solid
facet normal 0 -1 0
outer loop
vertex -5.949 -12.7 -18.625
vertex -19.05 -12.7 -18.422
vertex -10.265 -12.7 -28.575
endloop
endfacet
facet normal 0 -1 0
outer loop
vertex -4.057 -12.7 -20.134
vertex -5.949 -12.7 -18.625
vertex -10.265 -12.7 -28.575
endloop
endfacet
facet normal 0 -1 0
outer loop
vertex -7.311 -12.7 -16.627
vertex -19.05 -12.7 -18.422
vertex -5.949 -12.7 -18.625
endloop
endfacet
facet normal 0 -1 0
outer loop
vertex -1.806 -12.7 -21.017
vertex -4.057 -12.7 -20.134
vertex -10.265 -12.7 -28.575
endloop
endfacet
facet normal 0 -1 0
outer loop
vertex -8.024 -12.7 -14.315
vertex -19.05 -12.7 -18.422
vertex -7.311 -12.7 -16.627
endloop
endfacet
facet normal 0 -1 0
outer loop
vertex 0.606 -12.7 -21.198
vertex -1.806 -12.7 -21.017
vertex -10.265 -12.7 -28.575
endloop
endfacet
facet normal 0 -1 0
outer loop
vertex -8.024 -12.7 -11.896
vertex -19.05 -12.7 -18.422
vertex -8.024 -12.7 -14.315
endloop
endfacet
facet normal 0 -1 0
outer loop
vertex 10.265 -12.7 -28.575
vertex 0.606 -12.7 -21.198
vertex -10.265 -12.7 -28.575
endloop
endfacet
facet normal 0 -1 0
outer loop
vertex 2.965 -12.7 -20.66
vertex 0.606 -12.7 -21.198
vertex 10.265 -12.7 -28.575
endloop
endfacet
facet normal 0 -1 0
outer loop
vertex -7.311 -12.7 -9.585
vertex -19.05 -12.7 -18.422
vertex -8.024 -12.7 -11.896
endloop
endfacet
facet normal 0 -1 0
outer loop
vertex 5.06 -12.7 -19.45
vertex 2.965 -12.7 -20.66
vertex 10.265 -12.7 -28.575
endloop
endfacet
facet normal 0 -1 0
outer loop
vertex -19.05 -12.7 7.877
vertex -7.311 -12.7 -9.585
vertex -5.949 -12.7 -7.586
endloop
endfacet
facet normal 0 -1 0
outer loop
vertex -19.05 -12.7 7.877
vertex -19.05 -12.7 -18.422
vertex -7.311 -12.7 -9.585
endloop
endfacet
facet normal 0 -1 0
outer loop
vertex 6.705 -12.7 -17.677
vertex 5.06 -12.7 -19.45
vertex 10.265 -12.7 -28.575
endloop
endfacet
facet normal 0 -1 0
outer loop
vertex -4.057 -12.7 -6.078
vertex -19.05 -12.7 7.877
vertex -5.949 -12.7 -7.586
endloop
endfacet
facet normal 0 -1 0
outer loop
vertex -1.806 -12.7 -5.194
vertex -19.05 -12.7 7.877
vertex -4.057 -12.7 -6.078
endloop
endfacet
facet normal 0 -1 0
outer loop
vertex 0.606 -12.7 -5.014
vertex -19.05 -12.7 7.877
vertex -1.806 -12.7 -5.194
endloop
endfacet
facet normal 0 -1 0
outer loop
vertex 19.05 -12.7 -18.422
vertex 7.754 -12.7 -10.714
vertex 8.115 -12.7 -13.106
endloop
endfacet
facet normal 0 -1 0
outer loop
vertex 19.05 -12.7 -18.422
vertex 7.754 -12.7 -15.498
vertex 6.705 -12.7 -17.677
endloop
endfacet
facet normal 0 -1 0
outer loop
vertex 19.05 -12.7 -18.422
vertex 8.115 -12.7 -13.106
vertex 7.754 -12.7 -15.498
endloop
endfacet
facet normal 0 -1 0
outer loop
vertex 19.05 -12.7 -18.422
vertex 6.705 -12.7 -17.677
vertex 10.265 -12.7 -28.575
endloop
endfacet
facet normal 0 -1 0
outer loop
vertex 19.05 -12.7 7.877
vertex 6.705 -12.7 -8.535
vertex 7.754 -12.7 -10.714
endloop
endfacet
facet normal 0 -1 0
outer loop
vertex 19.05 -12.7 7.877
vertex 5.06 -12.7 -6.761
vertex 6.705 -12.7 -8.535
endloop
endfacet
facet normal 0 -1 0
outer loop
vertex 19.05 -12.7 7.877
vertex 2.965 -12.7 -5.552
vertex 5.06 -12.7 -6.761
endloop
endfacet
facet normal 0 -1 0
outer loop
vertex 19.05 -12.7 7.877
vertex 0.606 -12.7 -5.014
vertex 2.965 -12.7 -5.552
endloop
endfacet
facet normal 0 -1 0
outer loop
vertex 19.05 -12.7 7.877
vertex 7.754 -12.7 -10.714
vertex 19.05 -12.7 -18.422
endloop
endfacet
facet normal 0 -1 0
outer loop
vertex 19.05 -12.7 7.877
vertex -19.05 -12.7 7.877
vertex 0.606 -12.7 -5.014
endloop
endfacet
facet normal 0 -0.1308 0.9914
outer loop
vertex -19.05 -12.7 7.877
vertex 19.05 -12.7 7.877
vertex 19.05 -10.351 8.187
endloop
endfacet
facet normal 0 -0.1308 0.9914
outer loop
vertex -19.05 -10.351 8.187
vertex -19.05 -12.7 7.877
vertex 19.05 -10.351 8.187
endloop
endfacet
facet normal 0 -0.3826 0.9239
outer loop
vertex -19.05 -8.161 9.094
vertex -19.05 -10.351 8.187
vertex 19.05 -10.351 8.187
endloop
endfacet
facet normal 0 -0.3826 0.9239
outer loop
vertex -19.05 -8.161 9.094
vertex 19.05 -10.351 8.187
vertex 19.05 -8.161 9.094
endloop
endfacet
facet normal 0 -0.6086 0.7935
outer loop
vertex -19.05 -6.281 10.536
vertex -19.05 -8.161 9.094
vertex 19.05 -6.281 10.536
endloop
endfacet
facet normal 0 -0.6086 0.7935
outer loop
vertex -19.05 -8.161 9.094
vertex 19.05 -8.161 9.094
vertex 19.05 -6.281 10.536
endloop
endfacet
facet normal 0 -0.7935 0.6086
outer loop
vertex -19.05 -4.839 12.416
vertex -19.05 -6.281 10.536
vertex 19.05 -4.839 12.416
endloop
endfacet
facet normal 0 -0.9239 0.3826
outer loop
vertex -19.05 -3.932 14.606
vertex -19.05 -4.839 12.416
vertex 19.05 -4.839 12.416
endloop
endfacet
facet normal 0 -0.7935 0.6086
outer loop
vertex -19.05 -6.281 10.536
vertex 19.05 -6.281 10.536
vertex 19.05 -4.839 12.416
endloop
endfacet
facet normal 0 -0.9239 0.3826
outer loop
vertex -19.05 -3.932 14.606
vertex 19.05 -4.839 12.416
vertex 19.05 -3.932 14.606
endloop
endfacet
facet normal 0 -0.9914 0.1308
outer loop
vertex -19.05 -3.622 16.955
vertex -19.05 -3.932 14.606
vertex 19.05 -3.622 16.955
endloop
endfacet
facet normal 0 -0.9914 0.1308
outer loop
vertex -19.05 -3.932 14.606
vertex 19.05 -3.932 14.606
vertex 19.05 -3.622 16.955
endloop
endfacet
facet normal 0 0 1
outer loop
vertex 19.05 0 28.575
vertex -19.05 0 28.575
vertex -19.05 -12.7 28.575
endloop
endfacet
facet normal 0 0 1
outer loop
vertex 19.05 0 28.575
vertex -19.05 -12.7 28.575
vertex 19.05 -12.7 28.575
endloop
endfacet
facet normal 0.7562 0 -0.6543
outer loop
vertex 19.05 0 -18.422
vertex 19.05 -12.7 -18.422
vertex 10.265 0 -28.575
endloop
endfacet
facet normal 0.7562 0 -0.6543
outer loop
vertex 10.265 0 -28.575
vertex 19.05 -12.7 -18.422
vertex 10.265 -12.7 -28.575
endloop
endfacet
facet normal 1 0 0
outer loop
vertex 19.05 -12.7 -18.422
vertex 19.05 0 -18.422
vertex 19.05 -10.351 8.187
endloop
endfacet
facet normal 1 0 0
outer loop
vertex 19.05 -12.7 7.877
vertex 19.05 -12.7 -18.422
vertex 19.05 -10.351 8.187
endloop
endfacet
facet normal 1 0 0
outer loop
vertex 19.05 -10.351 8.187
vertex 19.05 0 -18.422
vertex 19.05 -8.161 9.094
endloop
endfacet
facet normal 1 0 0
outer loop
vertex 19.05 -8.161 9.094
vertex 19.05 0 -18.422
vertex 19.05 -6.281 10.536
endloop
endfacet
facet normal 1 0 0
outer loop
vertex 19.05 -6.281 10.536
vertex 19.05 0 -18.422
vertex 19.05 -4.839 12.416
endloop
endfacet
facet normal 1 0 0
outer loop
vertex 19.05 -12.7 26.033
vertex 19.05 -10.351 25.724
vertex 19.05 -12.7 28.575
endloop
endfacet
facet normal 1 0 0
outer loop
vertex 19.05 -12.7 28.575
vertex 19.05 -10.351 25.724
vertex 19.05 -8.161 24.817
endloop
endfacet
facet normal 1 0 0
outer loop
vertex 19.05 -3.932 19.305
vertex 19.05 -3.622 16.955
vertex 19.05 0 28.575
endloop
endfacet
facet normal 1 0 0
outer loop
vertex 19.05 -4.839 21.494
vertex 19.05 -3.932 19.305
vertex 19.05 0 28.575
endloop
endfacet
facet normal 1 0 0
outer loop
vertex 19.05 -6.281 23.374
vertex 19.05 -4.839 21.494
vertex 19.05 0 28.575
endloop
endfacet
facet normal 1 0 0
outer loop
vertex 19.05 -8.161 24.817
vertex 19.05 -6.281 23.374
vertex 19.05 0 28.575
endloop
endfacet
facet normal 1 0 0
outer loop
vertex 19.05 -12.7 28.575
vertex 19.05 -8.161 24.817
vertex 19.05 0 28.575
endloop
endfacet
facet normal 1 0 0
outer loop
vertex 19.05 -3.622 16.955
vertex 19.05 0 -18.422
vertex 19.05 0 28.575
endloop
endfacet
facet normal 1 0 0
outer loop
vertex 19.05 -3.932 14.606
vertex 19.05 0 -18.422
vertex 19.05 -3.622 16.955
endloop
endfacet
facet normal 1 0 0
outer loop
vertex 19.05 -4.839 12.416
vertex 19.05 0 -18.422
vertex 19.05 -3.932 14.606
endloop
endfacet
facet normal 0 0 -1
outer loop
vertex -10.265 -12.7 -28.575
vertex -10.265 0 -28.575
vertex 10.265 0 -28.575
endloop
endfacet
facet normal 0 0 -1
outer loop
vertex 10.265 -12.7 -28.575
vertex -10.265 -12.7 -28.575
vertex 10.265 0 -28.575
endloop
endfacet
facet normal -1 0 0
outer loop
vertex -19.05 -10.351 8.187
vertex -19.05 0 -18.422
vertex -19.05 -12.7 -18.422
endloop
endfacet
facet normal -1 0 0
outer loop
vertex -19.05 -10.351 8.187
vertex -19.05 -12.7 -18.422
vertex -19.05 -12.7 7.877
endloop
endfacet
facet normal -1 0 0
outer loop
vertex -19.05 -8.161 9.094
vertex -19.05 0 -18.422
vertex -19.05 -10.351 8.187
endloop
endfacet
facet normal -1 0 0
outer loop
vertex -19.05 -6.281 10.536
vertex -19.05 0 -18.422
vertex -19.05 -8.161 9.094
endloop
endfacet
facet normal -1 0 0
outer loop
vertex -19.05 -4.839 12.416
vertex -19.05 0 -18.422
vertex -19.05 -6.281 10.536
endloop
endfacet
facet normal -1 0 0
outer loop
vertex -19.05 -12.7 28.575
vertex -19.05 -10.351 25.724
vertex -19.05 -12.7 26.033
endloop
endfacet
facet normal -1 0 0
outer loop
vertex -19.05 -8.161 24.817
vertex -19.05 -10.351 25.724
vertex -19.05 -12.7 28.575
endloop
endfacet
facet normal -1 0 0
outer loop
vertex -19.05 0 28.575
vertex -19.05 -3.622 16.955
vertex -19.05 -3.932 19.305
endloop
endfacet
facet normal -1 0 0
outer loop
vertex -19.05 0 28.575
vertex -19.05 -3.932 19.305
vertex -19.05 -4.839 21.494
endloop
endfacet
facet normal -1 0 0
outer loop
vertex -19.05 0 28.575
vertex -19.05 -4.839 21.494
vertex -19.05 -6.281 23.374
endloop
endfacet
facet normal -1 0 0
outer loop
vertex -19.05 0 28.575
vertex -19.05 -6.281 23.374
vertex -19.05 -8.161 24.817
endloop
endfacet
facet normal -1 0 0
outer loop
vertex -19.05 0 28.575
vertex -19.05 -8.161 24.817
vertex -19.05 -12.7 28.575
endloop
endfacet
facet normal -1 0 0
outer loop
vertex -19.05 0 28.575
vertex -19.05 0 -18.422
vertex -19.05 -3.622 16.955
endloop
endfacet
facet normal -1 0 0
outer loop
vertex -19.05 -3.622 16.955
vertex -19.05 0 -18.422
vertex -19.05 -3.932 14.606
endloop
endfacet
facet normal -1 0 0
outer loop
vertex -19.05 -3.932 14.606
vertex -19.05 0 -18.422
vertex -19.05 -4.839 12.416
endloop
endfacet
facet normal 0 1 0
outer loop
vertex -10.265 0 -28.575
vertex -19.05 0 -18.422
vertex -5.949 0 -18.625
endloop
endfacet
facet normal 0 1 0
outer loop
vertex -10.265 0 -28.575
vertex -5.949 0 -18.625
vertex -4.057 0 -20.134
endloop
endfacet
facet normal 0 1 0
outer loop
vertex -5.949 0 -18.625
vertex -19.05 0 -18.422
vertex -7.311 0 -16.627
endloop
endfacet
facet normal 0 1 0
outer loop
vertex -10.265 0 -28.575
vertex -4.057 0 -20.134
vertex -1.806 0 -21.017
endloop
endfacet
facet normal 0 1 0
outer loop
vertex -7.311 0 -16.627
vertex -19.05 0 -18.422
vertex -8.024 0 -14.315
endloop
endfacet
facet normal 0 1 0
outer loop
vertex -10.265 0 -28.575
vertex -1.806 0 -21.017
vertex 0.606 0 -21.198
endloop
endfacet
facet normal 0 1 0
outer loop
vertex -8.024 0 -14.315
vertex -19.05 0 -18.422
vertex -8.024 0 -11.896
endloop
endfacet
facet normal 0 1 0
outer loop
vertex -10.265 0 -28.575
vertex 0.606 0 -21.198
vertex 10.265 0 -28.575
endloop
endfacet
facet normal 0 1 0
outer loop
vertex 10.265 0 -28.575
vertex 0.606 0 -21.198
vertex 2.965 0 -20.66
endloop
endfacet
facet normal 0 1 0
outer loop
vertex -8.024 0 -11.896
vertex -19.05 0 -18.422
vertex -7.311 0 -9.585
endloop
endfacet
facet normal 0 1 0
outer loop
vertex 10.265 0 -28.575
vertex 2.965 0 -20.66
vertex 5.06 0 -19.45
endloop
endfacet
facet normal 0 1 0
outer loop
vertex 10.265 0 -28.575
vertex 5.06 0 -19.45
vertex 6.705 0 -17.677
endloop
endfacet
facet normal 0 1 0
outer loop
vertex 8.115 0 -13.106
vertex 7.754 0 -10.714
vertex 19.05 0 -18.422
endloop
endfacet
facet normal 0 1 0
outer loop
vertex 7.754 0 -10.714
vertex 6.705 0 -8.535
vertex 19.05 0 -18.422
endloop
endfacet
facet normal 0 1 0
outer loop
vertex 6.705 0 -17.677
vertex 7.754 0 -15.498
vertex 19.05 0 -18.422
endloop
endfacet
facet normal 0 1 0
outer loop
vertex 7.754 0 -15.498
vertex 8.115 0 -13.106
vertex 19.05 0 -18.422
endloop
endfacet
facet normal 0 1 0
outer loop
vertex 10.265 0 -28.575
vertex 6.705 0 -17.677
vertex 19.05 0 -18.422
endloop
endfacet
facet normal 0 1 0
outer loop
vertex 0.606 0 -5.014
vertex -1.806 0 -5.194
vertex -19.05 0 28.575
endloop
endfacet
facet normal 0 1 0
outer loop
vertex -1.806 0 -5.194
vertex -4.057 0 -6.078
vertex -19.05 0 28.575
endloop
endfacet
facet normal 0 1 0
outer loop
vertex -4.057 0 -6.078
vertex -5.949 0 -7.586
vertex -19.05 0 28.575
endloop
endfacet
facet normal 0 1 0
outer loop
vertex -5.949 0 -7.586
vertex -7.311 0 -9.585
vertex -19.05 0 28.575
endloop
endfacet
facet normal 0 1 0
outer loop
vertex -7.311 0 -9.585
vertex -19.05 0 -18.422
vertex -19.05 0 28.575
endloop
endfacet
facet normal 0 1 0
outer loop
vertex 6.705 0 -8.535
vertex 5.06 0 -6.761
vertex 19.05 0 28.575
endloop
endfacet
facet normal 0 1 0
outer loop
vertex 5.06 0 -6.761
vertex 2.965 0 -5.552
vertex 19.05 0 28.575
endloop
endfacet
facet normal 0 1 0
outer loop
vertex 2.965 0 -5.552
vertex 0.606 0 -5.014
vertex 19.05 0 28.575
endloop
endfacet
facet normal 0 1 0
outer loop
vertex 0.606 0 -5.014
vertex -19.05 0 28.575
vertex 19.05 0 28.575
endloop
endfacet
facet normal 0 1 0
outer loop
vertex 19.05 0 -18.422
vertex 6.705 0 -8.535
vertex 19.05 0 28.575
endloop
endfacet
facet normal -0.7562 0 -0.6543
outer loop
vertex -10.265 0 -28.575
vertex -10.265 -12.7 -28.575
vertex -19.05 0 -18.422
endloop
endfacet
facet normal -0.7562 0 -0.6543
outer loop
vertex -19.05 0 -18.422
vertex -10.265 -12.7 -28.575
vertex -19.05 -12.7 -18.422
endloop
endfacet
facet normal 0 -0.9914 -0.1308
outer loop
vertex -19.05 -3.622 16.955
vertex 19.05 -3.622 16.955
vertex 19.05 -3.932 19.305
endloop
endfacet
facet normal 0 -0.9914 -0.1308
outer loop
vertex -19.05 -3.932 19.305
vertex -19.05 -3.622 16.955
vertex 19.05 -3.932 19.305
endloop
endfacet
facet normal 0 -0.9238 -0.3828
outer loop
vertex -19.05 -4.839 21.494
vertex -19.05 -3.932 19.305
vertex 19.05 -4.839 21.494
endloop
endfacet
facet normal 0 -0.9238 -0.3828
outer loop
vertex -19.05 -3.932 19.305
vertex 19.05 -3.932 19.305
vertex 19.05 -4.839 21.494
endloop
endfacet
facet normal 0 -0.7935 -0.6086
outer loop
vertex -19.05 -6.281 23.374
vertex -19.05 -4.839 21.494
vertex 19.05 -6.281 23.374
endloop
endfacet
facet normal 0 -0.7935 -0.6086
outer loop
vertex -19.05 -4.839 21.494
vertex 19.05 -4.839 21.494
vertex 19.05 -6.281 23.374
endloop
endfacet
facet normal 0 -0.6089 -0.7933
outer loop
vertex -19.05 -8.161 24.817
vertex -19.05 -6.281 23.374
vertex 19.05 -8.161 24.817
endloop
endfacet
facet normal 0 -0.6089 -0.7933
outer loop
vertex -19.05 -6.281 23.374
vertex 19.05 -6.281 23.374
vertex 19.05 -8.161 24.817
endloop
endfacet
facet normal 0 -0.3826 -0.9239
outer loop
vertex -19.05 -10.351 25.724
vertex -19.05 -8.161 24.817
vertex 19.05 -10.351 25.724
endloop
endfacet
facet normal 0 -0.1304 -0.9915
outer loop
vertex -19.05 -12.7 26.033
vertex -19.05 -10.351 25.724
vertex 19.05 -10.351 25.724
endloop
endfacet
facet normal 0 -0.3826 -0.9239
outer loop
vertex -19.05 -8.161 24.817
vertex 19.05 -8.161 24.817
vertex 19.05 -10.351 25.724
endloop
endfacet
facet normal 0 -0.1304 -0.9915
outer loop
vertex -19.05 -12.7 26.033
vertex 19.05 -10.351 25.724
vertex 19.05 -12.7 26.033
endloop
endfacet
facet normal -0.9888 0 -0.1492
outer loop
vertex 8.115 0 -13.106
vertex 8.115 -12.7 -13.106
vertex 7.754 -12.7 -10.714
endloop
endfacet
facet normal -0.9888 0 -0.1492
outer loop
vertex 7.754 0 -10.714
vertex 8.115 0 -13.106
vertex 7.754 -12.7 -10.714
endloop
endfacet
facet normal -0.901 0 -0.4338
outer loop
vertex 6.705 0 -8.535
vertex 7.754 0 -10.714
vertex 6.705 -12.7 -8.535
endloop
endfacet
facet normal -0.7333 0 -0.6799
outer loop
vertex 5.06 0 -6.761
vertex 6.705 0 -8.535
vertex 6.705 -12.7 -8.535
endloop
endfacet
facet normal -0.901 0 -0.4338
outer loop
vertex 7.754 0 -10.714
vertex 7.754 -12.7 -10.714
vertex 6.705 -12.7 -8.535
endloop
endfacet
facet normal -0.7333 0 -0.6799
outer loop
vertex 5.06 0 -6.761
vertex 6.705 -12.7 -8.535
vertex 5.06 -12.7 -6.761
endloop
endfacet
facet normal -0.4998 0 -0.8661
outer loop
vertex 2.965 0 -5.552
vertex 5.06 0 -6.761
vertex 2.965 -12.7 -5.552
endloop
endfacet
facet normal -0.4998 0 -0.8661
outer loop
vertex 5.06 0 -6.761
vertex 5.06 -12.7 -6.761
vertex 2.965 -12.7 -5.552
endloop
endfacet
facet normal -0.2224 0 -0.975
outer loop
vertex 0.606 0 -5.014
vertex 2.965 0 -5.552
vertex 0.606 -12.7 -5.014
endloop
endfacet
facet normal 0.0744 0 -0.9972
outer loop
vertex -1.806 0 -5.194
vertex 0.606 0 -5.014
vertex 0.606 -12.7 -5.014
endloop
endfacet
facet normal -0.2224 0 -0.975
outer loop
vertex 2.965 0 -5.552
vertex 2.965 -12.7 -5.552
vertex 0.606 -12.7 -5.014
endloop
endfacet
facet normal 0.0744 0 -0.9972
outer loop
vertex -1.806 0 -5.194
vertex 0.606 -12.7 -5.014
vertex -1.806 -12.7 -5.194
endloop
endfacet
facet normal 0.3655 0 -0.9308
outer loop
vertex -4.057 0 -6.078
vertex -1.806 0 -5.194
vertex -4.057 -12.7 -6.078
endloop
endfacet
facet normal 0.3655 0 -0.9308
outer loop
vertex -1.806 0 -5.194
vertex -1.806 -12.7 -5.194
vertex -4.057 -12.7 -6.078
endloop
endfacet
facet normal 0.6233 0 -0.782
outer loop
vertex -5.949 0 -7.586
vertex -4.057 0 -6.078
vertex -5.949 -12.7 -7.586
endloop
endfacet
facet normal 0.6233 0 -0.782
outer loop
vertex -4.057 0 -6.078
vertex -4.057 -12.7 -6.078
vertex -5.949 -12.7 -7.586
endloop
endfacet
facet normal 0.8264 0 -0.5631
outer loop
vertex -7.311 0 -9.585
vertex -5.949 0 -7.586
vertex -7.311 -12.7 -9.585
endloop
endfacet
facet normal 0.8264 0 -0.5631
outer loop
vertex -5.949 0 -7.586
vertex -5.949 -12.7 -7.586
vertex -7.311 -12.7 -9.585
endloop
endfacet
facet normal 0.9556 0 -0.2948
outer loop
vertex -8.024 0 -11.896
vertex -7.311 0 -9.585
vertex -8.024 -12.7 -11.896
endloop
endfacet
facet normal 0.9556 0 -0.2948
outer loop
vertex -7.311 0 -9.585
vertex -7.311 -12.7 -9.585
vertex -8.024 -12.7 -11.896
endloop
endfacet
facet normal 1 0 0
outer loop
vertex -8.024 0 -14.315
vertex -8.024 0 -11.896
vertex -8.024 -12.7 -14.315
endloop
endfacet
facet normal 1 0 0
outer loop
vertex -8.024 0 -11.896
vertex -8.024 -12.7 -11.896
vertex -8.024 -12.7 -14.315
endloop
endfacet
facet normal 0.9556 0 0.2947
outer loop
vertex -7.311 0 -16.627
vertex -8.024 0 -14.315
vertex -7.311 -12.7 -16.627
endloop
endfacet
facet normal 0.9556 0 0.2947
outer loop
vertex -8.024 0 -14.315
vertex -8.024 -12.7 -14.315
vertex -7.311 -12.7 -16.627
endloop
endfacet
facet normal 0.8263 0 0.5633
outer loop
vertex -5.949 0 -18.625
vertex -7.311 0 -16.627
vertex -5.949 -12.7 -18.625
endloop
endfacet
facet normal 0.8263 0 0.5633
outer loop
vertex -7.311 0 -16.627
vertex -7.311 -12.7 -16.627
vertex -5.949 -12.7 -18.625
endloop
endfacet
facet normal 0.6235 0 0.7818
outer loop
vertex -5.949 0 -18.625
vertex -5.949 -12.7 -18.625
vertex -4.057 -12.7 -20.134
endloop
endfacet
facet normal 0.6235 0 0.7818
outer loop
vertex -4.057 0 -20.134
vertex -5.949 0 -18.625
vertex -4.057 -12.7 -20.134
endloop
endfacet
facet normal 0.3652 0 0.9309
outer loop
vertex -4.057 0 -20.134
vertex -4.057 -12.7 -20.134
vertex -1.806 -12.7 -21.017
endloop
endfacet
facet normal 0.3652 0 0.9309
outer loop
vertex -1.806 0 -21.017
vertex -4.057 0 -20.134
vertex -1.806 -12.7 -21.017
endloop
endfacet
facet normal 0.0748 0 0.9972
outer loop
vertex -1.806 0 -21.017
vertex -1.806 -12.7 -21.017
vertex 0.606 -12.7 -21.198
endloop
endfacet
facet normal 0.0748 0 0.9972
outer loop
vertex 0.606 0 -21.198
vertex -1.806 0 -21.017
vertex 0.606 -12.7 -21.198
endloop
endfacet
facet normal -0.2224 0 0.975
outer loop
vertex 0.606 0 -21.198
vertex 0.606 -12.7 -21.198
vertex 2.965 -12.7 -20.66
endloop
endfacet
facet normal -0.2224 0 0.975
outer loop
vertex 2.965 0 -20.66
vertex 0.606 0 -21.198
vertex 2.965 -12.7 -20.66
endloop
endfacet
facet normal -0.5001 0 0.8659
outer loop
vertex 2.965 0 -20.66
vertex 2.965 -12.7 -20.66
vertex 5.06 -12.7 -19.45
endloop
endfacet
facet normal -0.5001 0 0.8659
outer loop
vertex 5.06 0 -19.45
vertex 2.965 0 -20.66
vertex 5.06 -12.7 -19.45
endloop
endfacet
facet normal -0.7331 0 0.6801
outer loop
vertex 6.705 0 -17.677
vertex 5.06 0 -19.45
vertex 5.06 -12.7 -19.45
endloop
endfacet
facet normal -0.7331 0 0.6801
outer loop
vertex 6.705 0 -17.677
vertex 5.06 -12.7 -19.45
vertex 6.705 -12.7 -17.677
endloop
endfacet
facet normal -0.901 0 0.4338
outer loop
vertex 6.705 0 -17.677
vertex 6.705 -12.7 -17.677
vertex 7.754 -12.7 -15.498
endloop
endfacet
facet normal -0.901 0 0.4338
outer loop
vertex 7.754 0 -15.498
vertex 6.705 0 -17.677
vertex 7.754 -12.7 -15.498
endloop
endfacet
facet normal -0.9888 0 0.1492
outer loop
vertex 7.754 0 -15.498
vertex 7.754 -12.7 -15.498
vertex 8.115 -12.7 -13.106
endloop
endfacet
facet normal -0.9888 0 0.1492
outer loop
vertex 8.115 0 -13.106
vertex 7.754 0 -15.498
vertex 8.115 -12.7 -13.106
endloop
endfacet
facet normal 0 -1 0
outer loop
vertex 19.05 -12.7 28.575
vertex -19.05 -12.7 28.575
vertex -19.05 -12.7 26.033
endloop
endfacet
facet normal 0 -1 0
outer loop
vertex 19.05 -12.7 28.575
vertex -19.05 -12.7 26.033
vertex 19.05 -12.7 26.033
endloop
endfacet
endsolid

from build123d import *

# Parameters (mm, degrees)
F0_W      = 38.1
F0_H      = 57.15
F1_DEPTH  = 12.7
F3_DEPTH  = 25.4
F7_DEPTH  = 101.6
F9_DEPTH  = 2.54
F10_R     = 8.114992
F11_DEPTH = 25.4


with BuildPart() as f1:
    # F0 (on Front) → F1 (new body)
    with BuildSketch(Plane.XZ):
        Rectangle(F0_W, F0_H)
    extrude(amount=F1_DEPTH)

    # F2 (on face) → F3 (cut)
    with BuildSketch(Plane.XZ.offset(12.7)):
        Polygon((19.05, -18.421547), (10.264741, -28.575), (19.05, -28.575), align=None)
        Polygon((-19.05, -28.575), (-10.264741, -28.575), (-19.05, -18.421547), align=None)
    extrude(amount=-F3_DEPTH, mode=Mode.SUBTRACT)

    # F5 (on face) → F7 (cut)
    with BuildSketch(Plane.YZ.offset(19.05)):
        with BuildLine():
            ThreePointArc((-12.7, 7.877494), (-6.281125, 10.536279), (-3.62234, 16.955154))
            ThreePointArc((-3.62234, 16.955154), (-6.281125, 23.374029), (-12.7, 26.032814))
            Line((-12.7, 26.032814), (-12.7, 7.877494))
        make_face()
        with BuildLine():
            Line((-12.7, 7.877494), (-12.7, 26.032814))
            ThreePointArc((-12.7, 26.032814), (-21.77766, 16.955154), (-12.7, 7.877494))
        make_face()
    extrude(amount=-F7_DEPTH, mode=Mode.SUBTRACT)

    # F8 (on face) → F9 (join)
    with BuildSketch(Plane(origin=(0, 0, 0), x_dir=(-1, 0, 0), z_dir=(0, 1, 0))):
        Polygon((-19.05, 28.575), (-19.05, -18.421547), (-10.264741, -28.575), (10.264741, -28.575), (19.05, -18.421547), (19.05, 28.575), align=None)
    extrude(amount=-F9_DEPTH)

    # F10 (on face) → F11 (cut)
    with BuildSketch(Plane.XZ.offset(12.7)):
        with Locations((0, -13.105877)):
            Circle(F10_R)
    extrude(amount=-F11_DEPTH, mode=Mode.SUBTRACT)


solid = f1.part
